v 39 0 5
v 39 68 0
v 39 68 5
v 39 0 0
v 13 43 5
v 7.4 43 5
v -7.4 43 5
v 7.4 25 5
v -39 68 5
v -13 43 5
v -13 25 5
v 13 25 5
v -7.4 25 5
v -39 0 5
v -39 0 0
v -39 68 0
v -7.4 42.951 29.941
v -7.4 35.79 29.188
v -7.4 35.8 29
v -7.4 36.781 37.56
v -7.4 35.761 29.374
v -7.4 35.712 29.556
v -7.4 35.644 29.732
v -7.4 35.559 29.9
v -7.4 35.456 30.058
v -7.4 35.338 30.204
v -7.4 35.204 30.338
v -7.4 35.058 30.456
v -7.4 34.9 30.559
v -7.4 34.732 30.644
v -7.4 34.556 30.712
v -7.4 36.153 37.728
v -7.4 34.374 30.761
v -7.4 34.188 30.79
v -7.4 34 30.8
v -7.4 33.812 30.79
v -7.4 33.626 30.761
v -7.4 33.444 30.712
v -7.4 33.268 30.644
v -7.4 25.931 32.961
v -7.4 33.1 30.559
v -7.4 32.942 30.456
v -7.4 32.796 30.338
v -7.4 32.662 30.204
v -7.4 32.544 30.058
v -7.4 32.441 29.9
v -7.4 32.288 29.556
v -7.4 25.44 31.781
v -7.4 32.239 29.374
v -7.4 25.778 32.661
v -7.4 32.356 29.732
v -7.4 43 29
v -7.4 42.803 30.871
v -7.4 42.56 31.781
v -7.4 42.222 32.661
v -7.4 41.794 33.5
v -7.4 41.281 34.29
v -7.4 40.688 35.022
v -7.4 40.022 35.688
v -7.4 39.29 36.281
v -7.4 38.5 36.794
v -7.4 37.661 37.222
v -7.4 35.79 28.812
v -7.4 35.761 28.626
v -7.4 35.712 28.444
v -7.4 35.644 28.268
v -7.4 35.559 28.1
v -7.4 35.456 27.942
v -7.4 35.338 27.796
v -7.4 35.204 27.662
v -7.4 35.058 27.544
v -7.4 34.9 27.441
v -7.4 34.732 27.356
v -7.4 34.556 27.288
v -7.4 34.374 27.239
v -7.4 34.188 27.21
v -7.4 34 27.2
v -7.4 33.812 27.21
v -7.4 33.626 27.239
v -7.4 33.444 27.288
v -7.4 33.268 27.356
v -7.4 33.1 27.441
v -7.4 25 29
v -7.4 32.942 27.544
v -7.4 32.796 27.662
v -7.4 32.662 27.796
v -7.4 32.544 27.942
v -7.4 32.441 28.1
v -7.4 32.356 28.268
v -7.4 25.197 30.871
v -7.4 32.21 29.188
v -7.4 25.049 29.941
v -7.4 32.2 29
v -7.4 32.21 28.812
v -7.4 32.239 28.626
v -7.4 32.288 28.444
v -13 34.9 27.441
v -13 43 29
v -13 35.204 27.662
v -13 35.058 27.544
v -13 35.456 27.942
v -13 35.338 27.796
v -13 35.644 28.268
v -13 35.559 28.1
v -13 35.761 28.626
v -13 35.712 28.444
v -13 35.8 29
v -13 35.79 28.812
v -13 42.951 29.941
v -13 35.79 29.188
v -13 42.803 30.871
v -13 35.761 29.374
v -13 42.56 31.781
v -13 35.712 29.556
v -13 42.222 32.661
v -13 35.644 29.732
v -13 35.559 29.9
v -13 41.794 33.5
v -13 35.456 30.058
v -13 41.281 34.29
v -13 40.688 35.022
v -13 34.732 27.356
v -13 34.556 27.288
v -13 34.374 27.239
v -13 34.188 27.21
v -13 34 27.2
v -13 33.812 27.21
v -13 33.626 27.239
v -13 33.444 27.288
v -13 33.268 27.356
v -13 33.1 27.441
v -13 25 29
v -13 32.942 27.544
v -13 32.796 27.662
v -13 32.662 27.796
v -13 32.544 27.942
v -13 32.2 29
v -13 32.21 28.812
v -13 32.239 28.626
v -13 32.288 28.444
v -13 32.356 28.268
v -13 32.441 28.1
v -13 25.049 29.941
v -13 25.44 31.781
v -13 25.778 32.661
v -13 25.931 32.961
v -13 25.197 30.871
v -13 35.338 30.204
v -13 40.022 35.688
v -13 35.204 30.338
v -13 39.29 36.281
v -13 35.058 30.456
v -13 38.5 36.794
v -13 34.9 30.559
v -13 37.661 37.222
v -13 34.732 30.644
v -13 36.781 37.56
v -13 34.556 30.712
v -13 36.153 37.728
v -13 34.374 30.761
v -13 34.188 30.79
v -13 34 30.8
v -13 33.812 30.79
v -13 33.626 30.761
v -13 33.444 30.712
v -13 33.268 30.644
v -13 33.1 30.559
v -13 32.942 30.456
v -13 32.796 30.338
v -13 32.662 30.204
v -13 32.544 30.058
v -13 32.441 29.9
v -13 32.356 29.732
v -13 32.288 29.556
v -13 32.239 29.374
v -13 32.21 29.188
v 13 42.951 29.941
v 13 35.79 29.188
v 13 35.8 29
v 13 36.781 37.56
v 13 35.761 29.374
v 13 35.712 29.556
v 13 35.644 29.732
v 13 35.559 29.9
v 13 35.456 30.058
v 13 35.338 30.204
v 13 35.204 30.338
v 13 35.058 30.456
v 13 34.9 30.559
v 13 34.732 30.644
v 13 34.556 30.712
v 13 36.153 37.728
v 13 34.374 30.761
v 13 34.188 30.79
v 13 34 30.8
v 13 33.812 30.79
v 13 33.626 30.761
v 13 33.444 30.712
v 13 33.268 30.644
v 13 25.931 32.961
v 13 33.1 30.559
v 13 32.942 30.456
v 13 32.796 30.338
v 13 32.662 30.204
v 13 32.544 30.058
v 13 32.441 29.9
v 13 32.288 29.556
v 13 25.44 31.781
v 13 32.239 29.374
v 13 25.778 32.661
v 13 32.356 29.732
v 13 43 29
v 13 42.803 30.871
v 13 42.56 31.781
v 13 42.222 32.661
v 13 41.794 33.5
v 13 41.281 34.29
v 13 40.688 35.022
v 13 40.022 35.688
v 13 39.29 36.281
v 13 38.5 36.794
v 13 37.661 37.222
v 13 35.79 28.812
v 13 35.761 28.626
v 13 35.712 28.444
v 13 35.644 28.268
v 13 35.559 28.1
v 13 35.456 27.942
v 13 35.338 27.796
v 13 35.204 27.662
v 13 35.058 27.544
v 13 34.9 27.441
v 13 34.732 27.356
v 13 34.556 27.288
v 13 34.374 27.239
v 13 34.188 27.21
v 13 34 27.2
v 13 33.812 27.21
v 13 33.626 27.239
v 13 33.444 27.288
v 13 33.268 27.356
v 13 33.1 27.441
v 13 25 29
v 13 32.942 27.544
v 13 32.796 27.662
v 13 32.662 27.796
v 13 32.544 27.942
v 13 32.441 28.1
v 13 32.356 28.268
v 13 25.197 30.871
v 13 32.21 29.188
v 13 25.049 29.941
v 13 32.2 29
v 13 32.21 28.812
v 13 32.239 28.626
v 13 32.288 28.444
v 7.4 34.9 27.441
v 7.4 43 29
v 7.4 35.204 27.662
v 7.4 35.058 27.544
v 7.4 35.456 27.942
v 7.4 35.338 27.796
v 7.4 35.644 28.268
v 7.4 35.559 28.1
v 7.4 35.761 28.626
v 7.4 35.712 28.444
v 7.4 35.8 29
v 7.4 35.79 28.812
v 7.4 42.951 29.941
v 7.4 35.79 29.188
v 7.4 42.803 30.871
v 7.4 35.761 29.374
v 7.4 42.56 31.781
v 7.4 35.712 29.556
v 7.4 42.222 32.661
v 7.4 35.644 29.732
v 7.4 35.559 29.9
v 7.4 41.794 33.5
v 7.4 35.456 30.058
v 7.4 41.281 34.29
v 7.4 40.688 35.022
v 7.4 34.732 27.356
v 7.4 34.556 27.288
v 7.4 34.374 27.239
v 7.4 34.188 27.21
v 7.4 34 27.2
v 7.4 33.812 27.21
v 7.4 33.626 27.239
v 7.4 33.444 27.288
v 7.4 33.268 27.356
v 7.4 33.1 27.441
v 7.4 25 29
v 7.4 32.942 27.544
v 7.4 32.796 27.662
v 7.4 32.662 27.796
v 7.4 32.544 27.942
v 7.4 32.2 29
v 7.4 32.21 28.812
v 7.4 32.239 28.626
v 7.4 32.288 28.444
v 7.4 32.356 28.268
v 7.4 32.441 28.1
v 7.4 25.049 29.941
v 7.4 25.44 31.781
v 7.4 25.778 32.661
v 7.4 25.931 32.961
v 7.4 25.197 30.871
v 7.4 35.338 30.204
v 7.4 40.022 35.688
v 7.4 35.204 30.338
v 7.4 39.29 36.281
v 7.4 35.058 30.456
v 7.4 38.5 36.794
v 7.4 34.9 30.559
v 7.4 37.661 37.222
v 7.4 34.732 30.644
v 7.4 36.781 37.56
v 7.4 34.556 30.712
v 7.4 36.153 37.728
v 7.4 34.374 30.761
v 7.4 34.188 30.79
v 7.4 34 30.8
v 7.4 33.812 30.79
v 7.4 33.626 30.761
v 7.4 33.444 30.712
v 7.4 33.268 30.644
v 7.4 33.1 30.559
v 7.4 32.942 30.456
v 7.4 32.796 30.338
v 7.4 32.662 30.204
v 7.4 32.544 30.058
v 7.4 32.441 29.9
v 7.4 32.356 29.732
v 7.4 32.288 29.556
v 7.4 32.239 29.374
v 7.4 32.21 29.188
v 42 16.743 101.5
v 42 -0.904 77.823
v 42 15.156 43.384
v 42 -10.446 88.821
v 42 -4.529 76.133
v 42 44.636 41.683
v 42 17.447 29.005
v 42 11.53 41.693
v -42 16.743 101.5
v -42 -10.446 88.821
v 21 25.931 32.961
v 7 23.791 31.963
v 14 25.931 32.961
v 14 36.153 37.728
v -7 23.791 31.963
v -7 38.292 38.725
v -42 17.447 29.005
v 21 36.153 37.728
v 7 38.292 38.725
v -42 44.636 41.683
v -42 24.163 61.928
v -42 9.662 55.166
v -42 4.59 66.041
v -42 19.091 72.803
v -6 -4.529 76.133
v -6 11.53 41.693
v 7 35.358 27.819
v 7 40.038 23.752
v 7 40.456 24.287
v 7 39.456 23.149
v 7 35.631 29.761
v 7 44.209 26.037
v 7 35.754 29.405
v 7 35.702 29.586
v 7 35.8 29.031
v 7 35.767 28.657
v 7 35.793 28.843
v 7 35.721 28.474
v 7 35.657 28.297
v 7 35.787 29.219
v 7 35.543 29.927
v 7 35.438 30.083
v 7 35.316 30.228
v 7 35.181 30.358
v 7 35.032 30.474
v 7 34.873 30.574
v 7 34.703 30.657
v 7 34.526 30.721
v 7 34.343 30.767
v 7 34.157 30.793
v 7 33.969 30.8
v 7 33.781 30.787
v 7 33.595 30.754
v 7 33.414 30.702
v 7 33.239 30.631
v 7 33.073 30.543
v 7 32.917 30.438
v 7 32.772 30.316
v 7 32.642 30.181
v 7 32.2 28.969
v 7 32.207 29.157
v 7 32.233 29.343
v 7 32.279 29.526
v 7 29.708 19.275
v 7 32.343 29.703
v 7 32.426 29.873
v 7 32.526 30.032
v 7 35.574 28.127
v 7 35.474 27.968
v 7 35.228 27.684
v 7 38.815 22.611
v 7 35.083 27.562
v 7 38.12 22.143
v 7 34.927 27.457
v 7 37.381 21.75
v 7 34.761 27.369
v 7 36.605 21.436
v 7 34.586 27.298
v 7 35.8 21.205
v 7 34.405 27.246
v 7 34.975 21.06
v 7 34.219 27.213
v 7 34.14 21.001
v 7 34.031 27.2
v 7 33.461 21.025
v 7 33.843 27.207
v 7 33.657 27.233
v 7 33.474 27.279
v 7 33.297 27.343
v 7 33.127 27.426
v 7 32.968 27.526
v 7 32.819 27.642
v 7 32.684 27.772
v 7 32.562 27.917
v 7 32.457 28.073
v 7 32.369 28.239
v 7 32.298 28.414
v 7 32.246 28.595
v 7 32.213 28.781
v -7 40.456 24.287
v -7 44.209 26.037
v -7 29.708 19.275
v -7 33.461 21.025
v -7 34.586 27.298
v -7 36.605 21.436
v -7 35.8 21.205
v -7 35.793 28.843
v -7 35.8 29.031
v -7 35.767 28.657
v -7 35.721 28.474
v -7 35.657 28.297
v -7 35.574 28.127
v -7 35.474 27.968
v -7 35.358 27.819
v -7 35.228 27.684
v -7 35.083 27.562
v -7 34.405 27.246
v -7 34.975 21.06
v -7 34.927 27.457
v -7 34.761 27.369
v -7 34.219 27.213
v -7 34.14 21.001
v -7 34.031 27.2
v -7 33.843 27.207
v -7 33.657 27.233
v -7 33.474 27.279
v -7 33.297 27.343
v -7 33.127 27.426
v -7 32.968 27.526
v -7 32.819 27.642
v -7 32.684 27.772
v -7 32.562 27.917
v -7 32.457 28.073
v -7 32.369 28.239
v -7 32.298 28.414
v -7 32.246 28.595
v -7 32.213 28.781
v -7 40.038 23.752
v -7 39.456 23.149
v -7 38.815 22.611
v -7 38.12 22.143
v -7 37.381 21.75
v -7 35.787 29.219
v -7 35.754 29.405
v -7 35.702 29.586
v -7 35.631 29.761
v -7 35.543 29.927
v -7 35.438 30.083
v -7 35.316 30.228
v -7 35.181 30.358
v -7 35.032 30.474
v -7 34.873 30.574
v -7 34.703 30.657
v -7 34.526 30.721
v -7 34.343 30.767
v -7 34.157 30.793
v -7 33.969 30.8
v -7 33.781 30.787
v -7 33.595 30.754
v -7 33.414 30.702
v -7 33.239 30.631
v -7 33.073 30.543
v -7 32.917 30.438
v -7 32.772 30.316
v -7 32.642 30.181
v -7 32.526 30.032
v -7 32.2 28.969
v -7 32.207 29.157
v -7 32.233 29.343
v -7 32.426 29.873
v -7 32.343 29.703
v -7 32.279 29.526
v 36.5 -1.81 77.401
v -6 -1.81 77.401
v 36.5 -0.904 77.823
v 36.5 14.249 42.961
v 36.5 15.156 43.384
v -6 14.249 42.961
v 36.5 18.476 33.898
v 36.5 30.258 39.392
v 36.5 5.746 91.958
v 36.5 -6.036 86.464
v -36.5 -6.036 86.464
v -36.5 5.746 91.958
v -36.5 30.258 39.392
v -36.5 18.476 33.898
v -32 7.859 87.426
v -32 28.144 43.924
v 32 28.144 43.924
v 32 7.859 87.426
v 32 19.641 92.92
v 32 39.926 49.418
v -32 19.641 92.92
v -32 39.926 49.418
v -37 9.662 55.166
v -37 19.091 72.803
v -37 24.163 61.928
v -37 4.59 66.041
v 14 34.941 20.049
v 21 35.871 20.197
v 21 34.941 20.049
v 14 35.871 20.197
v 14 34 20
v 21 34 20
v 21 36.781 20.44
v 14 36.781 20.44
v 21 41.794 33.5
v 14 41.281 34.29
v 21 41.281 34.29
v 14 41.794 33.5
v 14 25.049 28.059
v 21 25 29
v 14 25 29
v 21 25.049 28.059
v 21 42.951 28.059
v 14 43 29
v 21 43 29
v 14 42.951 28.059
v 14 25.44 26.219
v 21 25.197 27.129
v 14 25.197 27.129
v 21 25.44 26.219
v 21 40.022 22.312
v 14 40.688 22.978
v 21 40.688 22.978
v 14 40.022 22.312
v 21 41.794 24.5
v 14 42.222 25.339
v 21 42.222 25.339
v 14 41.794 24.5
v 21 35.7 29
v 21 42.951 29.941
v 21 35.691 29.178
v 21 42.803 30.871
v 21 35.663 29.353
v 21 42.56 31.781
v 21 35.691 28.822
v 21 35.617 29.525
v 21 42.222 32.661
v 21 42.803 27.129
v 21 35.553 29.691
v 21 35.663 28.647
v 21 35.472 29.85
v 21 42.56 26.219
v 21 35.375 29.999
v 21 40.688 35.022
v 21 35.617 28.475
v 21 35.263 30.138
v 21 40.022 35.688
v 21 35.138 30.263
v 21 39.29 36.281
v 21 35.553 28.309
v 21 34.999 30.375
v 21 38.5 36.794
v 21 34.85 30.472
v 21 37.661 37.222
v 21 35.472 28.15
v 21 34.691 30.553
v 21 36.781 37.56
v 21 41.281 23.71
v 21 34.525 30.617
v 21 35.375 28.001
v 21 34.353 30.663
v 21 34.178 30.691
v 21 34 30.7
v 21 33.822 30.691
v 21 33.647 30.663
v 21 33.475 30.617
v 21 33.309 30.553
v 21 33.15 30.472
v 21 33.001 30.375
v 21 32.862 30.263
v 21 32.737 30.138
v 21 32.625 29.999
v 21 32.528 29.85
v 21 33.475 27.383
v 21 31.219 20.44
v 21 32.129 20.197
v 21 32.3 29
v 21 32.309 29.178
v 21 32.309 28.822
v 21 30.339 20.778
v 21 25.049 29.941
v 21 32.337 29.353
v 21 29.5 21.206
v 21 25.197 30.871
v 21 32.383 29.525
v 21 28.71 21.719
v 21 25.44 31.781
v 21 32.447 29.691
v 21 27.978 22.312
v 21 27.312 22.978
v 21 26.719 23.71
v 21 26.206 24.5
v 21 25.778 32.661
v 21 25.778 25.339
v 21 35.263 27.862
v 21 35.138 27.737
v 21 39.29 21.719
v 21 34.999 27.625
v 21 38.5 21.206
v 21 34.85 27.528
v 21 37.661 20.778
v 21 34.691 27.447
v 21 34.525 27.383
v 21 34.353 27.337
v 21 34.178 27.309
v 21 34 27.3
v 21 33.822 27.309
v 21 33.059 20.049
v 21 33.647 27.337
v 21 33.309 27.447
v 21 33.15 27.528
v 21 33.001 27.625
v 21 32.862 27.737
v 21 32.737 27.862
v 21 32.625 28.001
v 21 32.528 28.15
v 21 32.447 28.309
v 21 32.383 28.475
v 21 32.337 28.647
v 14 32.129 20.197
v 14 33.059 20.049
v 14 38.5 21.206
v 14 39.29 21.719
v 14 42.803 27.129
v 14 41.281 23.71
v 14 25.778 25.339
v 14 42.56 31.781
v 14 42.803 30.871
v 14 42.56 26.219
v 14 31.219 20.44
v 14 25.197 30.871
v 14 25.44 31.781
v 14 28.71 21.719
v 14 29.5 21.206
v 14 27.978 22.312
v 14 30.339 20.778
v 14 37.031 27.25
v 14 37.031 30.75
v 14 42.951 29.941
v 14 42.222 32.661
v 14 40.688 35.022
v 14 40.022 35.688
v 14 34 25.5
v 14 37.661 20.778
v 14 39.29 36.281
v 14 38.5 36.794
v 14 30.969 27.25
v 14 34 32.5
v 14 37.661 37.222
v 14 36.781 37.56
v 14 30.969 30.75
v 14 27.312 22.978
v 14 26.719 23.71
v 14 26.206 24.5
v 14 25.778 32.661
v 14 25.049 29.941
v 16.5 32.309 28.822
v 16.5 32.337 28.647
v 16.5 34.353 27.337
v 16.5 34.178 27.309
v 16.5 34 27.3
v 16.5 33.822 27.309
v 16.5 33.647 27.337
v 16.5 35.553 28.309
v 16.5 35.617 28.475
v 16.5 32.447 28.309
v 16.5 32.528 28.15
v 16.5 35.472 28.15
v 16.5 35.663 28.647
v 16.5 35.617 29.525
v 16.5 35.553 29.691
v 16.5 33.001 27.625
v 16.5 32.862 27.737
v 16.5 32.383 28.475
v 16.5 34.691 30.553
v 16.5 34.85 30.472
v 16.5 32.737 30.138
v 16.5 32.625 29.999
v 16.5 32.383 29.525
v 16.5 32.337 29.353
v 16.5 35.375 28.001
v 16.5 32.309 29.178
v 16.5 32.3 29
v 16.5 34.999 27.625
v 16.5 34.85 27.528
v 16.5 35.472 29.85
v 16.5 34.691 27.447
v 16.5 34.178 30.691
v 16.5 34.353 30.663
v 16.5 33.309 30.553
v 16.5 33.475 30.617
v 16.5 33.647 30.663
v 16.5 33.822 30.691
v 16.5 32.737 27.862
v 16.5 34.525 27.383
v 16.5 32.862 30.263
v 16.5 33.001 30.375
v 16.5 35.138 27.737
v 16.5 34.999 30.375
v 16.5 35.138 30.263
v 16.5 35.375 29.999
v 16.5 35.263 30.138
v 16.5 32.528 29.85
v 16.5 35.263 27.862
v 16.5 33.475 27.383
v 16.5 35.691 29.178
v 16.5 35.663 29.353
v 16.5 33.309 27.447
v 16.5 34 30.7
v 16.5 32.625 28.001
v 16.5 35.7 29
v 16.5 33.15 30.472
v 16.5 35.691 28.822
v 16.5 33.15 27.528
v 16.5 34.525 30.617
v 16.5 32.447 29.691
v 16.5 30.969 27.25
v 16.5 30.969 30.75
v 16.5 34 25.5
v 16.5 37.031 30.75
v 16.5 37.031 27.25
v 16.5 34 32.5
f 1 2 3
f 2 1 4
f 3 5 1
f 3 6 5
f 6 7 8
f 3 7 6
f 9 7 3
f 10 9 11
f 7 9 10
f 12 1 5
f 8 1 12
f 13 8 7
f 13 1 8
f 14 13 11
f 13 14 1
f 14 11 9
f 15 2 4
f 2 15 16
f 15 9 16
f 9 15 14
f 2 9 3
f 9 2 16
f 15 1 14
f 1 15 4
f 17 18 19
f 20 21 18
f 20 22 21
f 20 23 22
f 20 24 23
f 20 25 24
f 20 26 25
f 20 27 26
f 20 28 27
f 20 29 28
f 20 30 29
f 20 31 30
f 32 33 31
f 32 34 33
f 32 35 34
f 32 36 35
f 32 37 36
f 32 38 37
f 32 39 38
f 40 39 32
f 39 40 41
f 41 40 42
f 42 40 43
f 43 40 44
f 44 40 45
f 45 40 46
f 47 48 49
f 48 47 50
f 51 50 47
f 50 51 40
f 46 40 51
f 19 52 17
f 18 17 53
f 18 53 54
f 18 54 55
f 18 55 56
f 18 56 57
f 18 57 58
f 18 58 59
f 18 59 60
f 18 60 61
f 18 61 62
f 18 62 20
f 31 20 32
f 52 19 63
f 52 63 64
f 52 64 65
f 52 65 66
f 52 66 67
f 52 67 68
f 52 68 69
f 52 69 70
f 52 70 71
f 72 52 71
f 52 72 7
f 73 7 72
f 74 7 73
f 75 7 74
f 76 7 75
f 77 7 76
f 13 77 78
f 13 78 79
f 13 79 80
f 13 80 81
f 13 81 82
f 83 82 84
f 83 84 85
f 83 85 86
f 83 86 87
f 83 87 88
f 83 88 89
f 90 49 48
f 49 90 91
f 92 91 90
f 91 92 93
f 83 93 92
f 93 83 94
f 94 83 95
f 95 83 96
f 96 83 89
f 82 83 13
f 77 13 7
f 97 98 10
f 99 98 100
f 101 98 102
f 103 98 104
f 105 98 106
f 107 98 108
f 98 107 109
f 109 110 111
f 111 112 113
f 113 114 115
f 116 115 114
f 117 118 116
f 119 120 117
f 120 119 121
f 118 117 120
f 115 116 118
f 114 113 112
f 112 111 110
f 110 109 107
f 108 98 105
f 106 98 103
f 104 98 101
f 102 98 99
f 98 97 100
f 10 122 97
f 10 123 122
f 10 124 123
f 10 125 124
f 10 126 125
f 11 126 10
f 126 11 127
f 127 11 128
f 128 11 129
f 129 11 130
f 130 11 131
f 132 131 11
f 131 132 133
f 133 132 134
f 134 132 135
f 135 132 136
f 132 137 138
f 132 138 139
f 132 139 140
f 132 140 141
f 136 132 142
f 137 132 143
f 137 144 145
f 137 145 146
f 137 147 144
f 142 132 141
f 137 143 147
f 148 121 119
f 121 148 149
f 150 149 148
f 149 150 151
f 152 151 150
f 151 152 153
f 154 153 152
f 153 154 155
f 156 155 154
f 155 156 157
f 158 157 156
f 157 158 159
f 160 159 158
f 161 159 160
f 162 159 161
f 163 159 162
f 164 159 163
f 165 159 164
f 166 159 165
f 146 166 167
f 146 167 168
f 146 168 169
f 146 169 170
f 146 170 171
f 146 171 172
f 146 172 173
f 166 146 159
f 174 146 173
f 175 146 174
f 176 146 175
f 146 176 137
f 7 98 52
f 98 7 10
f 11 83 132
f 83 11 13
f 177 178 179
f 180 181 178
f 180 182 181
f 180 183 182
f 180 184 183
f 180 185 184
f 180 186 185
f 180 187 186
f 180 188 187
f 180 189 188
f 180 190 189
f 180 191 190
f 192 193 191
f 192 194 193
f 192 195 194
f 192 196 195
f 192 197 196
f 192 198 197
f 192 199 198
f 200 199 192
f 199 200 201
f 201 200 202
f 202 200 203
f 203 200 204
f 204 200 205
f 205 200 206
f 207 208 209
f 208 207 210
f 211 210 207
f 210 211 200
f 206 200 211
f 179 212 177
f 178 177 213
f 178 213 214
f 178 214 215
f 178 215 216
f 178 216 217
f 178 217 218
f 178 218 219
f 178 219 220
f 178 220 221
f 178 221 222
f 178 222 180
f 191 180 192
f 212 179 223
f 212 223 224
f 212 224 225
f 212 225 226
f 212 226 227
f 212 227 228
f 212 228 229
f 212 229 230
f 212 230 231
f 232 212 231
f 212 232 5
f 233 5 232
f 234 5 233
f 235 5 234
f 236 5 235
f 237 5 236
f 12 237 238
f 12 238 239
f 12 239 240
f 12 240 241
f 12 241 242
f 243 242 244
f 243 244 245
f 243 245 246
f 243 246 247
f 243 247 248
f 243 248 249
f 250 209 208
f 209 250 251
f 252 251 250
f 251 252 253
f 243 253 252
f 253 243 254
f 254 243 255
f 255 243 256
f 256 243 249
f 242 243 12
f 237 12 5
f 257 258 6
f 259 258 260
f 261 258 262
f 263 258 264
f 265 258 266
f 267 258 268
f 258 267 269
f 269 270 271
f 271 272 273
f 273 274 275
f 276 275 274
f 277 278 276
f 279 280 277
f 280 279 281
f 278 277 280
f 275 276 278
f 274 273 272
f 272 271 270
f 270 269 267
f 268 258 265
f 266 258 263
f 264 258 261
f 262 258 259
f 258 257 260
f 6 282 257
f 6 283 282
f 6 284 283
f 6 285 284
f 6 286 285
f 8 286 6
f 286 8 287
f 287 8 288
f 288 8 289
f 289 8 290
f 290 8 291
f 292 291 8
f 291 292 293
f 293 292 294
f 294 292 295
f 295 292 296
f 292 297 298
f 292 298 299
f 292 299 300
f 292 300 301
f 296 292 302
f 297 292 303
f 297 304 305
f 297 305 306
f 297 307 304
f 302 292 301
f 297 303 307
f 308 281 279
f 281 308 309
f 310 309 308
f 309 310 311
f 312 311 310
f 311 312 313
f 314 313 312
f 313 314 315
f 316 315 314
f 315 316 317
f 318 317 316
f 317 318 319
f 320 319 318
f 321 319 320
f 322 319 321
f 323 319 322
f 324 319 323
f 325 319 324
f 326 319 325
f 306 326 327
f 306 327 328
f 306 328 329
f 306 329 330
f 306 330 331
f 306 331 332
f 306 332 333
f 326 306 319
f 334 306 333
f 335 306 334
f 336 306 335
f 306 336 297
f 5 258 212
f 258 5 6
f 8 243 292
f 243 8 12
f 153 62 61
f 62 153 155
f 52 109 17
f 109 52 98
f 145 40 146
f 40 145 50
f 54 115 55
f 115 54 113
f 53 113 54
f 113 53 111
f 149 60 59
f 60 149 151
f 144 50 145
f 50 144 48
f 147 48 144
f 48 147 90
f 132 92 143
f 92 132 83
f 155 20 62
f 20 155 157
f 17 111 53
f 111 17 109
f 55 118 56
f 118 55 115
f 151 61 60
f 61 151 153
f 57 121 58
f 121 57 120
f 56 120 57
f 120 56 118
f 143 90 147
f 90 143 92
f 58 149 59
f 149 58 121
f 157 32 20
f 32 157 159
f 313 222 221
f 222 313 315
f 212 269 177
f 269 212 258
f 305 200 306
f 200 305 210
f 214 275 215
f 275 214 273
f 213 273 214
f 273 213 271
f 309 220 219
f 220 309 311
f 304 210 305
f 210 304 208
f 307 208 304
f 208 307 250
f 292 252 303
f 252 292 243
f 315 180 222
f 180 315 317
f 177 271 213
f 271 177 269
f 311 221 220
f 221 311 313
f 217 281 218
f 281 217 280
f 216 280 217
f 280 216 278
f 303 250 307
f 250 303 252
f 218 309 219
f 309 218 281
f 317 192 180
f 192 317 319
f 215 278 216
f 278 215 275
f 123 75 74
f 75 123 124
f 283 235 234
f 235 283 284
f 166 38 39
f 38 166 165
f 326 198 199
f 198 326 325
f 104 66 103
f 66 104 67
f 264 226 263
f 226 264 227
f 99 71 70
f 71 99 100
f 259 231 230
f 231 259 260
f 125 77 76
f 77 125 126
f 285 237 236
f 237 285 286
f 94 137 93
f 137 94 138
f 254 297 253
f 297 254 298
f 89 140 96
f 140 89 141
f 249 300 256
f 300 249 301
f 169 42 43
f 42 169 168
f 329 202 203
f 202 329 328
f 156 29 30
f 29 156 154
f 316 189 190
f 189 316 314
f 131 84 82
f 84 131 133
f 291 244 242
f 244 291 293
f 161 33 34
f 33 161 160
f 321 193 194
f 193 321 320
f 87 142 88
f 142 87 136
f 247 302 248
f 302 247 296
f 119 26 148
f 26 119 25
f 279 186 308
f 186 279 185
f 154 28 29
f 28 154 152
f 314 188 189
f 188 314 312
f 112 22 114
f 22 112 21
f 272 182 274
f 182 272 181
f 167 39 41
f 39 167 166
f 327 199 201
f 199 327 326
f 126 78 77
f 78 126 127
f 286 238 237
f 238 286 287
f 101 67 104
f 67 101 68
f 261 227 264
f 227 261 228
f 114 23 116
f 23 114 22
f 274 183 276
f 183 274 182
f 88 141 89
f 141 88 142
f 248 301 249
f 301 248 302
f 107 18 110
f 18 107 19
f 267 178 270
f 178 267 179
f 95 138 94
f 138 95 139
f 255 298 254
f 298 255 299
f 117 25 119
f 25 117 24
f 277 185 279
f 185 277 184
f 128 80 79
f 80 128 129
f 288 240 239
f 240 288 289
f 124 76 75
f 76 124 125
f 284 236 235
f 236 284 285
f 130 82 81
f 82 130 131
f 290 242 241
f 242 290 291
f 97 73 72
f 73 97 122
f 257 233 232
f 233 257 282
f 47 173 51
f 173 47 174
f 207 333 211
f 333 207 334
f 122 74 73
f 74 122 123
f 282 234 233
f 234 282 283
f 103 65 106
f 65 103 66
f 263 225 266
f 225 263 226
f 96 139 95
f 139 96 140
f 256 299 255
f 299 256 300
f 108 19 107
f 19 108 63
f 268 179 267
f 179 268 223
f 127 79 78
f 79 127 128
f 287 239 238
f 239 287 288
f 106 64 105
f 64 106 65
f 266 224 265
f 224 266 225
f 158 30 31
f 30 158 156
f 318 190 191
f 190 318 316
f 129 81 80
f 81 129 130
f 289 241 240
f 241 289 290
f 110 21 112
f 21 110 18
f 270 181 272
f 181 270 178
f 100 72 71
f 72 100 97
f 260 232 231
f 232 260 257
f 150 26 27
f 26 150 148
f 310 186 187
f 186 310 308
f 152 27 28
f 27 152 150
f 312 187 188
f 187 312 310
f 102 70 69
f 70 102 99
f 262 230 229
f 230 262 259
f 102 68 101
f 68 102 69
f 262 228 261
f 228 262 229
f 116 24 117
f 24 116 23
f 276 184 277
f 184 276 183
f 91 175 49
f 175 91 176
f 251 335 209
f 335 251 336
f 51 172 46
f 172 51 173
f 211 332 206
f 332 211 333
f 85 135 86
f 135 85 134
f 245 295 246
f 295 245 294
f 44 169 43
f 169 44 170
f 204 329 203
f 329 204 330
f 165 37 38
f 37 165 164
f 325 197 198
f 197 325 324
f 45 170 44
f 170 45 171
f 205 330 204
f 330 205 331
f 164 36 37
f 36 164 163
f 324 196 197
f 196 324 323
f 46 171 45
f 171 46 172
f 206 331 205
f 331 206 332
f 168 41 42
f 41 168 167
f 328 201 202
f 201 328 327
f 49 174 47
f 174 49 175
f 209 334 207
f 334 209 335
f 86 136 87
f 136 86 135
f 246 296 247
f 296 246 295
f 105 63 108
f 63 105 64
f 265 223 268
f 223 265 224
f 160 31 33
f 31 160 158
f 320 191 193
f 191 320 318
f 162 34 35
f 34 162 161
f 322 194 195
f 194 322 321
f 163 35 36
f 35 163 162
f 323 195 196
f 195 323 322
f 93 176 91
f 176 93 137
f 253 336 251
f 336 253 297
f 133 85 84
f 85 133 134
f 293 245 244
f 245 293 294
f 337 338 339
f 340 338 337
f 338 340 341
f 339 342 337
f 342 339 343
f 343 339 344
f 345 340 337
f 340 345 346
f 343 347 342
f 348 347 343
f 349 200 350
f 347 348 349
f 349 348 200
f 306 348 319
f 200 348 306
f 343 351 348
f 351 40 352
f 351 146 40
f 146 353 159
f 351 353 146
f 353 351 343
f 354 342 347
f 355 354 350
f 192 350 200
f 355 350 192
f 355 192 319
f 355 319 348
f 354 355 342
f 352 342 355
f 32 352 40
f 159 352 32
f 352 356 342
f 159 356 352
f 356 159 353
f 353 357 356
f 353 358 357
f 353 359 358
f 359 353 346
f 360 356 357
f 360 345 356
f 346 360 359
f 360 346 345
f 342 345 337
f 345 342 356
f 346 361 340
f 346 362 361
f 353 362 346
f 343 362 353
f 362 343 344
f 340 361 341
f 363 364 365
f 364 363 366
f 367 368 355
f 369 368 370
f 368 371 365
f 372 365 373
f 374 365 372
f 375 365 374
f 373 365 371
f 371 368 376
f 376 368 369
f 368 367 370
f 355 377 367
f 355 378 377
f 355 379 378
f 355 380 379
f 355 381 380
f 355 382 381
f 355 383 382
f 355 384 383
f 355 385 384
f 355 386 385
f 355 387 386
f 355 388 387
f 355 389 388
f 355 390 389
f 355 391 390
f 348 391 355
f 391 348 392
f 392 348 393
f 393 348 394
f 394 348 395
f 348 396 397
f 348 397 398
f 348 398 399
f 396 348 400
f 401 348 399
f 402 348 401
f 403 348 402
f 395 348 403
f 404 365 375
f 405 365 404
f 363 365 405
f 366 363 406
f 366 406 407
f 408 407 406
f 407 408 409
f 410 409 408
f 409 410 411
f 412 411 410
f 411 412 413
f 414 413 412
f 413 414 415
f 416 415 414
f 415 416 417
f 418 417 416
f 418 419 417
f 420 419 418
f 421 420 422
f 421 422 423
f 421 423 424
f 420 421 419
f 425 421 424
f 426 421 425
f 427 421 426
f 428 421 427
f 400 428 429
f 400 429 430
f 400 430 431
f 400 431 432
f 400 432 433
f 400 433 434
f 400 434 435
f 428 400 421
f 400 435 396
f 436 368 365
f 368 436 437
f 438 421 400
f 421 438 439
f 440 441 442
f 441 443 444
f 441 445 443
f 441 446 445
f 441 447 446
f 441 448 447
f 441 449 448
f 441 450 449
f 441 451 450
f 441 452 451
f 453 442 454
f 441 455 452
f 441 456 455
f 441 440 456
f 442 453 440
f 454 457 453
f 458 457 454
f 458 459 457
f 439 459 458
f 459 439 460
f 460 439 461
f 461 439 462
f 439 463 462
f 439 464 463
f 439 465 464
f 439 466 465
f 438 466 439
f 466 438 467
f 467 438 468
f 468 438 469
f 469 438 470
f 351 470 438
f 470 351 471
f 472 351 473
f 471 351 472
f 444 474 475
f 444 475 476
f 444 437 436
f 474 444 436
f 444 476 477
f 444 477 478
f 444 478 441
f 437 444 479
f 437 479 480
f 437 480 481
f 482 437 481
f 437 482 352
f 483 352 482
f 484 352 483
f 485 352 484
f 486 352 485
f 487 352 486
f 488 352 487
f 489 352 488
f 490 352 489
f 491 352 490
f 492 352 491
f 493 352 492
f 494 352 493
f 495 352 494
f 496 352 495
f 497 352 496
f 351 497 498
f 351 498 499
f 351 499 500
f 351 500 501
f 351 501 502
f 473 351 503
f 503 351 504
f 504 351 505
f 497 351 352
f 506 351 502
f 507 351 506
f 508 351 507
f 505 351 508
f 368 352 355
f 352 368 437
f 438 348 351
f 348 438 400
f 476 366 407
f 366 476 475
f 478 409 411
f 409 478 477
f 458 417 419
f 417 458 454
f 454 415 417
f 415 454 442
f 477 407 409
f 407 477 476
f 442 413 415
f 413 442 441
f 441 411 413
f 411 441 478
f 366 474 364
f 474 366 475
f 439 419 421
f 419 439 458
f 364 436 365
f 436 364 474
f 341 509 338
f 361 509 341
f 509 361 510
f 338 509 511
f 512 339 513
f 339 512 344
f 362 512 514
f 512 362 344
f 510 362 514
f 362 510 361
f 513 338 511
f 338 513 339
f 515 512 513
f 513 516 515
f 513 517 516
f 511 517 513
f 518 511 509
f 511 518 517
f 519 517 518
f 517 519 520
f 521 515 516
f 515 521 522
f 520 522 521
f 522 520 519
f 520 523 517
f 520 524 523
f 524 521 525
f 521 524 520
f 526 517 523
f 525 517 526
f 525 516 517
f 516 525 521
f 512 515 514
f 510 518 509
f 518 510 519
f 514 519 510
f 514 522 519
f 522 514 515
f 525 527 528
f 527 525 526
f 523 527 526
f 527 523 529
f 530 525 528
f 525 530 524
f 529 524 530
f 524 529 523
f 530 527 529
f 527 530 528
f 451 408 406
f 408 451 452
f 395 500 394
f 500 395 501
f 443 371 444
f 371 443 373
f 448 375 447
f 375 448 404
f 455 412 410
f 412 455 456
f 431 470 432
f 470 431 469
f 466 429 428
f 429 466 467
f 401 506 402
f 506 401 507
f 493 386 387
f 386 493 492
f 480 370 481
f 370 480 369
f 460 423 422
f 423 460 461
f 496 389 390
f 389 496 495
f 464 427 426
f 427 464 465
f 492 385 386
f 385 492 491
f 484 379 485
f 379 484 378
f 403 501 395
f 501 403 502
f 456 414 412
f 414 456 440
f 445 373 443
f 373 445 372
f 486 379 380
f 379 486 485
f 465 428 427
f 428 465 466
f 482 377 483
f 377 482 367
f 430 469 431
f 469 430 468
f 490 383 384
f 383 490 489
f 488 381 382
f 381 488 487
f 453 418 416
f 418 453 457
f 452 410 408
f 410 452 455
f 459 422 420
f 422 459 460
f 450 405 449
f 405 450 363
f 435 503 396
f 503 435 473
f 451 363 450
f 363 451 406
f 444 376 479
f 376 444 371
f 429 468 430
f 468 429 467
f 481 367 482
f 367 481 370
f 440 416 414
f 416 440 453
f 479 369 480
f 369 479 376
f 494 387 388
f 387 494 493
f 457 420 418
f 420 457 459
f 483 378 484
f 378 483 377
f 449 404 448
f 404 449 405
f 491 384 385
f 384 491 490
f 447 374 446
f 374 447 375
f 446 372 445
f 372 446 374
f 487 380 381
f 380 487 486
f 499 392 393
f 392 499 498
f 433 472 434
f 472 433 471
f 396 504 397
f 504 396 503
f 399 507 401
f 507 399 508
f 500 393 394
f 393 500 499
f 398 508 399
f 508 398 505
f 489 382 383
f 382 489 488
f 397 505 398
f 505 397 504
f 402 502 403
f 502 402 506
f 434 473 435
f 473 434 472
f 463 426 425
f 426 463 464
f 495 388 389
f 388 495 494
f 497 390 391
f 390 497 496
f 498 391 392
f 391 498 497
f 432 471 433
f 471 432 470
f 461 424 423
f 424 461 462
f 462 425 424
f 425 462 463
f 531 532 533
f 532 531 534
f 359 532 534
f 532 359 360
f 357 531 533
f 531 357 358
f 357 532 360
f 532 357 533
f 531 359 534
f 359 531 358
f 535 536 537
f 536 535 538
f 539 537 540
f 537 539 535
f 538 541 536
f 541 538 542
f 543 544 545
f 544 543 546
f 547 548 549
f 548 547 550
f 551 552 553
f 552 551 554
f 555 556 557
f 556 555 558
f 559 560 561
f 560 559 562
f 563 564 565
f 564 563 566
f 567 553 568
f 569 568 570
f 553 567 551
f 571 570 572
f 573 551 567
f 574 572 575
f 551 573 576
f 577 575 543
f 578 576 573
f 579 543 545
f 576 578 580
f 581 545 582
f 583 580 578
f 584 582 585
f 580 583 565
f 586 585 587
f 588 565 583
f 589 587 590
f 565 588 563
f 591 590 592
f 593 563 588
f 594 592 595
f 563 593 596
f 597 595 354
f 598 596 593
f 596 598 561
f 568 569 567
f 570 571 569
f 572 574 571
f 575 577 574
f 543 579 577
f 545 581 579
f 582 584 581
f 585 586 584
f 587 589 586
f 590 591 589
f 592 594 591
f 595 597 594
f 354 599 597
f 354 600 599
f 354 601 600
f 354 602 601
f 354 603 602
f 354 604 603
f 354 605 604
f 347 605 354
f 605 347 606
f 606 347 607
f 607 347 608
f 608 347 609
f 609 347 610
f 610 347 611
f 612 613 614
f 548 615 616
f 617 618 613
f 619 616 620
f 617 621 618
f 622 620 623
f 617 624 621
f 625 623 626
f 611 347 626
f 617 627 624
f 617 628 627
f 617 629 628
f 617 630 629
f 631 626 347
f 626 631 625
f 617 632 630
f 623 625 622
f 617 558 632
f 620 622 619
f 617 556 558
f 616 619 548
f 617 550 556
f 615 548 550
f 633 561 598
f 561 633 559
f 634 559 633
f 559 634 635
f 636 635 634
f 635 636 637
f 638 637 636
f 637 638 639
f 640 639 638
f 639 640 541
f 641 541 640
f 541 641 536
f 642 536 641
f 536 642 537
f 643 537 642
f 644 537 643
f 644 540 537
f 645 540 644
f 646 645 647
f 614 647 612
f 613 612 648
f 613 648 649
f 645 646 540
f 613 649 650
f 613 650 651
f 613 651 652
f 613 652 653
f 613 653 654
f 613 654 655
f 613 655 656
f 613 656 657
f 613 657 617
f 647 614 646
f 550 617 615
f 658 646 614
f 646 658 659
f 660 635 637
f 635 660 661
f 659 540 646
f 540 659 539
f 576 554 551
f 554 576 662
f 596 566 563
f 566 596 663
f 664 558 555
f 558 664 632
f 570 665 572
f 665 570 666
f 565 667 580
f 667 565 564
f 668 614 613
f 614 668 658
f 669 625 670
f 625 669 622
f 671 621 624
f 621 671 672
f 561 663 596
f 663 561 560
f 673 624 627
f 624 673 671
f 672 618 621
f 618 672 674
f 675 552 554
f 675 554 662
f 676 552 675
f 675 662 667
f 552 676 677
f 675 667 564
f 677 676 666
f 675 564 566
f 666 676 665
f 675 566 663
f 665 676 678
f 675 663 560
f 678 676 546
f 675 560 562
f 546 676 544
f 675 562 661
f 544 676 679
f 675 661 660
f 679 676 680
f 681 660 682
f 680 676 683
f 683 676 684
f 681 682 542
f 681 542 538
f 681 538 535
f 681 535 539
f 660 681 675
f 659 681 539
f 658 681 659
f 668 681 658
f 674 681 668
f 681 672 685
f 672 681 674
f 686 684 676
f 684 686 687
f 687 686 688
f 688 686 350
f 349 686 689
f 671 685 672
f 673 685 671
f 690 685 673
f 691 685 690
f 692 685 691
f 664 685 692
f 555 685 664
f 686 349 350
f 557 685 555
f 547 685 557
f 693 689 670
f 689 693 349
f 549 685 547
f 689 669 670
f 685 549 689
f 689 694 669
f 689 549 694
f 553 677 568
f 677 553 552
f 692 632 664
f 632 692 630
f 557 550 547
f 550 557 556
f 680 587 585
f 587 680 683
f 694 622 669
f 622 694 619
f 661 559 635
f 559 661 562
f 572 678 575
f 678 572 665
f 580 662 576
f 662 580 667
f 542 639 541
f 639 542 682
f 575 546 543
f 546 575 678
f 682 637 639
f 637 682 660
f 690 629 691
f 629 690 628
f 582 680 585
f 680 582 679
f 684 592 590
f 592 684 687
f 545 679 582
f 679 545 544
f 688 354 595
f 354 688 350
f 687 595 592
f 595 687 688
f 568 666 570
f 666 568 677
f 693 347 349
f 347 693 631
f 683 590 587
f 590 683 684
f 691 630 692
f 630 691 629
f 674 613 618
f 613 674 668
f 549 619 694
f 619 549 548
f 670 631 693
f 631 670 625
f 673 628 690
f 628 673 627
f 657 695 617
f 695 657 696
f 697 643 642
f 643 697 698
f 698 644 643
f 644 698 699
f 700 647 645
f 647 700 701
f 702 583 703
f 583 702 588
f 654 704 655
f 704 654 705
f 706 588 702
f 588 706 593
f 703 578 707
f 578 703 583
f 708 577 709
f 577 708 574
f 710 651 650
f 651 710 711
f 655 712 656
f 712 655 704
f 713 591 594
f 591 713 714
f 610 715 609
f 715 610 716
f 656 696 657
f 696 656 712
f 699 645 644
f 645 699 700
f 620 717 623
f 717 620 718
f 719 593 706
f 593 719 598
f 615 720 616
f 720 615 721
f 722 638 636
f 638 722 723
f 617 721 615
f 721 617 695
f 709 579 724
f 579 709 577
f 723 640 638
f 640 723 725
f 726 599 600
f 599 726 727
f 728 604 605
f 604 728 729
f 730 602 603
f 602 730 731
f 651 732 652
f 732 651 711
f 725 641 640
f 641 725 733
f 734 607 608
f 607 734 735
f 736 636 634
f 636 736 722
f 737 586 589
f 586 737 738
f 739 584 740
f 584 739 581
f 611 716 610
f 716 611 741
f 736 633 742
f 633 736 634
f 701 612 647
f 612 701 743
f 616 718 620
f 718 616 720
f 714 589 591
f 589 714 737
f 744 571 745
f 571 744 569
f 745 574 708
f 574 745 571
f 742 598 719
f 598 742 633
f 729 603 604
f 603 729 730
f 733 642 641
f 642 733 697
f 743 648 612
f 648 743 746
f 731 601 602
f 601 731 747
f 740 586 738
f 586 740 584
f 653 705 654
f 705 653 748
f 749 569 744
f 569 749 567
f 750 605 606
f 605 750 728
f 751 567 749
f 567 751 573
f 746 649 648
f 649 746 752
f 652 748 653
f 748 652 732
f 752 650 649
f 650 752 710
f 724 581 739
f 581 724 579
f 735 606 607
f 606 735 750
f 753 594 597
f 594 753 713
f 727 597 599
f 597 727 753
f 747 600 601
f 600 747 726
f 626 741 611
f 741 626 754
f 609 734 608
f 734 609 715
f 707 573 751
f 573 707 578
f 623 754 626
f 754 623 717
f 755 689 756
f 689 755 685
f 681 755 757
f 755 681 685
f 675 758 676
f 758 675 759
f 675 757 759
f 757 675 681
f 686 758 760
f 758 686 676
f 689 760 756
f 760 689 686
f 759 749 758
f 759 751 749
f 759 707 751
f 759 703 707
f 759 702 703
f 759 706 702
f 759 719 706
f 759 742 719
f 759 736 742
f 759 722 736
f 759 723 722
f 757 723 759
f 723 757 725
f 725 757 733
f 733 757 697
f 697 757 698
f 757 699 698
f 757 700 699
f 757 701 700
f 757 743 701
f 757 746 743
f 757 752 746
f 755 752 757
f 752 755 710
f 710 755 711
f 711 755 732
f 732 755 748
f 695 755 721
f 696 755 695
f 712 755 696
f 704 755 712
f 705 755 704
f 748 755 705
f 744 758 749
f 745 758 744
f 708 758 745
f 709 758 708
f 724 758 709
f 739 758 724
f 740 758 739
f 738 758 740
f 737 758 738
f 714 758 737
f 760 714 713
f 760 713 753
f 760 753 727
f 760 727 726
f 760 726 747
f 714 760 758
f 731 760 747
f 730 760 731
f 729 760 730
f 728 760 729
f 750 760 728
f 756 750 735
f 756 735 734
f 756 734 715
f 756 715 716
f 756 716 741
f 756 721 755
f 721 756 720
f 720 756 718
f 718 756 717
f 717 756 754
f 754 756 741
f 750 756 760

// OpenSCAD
// Wio Terminal 可俯仰摆动复古小电视监视器 (OpenSCAD 源码)
// 支持 0° ~ 45° 自由俯仰调节
$fn = 60;
mode = "assembly"; // "assembly", "head", "base", "knob"
tilt_deg = 25;

module tv_head() {
    difference() {
        union() {
            translate([-42, 0, 0]) cube([84, 30, 66]);
            // 转轴凸耳 (宽 14mm)
            translate([-7, 7, -14]) cube([14, 16, 14]);
            translate([0, 15, -7]) rotate([0, 90, 0]) cylinder(r=8, h=14, center=true);
            // 旋钮
            translate([28, -2, 45]) rotate([-90,0,0]) cylinder(r=5.5, h=3.5);
            translate([28, -2, 23]) rotate([-90,0,0]) cylinder(r=5.5, h=3.5);
        }
        // 屏幕视窗 (50x38mm)
        translate([-6, -2, 33 - 19]) cube([50, 6, 38]);
        // Wio Terminal 槽 (73x13x58mm)
        translate([-36.5, 3, 33 - 29]) cube([73, 13, 58]);
        // 音腔/电池仓 (64x14x48mm)
        translate([-32, 15, 33 - 24]) cube([64, 14, 48]);
        // 转轴过孔 (M3)
        translate([0, 15, -7]) rotate([0, 90, 0]) cylinder(d=3.6, h=30, center=true);
        // Type-C 槽
        translate([-43, 4, 27]) cube([6, 16, 12]);
    }
}

module tv_base() {
    difference() {
        union() {
            translate([-39, 0, 0]) cube([78, 68, 5]);
            // 双叉支架 (内间距 14.8mm)
            translate([-13.0, 25, 5]) cube([5.6, 18, 24]);
            translate([  7.4, 25, 5]) cube([5.6, 18, 24]);
            translate([-10.2, 34, 29]) rotate([0, 90, 0]) cylinder(r=9, h=5.6, center=true);
            translate([ 10.2, 34, 29]) rotate([0, 90, 0]) cylinder(r=9, h=5.6, center=true);
        }
        // 转轴通孔
        translate([0, 34, 29]) rotate([0, 90, 0]) cylinder(d=3.6, h=50, center=true);
    }
}

module thumb_knob() {
    difference() {
        cylinder(r=9, h=7);
        translate([0, 0, -1]) cylinder(d=3.4, h=12);
        translate([0, 0, -1]) cylinder(r=3.5, h=3.5, $fn=6);
    }
}

if (mode == "assembly") {
    color("#444444") tv_base();
    translate([0, 34, 29]) rotate([tilt_deg, 0, 0]) translate([0, -15, 7]) color("#F5F2EB") tv_head();
    translate([14, 34, 29]) rotate([0, 90, 0]) color("#C8A165") thumb_knob();
} else if (mode == "head") tv_head();
else if (mode == "base") tv_base();
else if (mode == "knob") thumb_knob();
